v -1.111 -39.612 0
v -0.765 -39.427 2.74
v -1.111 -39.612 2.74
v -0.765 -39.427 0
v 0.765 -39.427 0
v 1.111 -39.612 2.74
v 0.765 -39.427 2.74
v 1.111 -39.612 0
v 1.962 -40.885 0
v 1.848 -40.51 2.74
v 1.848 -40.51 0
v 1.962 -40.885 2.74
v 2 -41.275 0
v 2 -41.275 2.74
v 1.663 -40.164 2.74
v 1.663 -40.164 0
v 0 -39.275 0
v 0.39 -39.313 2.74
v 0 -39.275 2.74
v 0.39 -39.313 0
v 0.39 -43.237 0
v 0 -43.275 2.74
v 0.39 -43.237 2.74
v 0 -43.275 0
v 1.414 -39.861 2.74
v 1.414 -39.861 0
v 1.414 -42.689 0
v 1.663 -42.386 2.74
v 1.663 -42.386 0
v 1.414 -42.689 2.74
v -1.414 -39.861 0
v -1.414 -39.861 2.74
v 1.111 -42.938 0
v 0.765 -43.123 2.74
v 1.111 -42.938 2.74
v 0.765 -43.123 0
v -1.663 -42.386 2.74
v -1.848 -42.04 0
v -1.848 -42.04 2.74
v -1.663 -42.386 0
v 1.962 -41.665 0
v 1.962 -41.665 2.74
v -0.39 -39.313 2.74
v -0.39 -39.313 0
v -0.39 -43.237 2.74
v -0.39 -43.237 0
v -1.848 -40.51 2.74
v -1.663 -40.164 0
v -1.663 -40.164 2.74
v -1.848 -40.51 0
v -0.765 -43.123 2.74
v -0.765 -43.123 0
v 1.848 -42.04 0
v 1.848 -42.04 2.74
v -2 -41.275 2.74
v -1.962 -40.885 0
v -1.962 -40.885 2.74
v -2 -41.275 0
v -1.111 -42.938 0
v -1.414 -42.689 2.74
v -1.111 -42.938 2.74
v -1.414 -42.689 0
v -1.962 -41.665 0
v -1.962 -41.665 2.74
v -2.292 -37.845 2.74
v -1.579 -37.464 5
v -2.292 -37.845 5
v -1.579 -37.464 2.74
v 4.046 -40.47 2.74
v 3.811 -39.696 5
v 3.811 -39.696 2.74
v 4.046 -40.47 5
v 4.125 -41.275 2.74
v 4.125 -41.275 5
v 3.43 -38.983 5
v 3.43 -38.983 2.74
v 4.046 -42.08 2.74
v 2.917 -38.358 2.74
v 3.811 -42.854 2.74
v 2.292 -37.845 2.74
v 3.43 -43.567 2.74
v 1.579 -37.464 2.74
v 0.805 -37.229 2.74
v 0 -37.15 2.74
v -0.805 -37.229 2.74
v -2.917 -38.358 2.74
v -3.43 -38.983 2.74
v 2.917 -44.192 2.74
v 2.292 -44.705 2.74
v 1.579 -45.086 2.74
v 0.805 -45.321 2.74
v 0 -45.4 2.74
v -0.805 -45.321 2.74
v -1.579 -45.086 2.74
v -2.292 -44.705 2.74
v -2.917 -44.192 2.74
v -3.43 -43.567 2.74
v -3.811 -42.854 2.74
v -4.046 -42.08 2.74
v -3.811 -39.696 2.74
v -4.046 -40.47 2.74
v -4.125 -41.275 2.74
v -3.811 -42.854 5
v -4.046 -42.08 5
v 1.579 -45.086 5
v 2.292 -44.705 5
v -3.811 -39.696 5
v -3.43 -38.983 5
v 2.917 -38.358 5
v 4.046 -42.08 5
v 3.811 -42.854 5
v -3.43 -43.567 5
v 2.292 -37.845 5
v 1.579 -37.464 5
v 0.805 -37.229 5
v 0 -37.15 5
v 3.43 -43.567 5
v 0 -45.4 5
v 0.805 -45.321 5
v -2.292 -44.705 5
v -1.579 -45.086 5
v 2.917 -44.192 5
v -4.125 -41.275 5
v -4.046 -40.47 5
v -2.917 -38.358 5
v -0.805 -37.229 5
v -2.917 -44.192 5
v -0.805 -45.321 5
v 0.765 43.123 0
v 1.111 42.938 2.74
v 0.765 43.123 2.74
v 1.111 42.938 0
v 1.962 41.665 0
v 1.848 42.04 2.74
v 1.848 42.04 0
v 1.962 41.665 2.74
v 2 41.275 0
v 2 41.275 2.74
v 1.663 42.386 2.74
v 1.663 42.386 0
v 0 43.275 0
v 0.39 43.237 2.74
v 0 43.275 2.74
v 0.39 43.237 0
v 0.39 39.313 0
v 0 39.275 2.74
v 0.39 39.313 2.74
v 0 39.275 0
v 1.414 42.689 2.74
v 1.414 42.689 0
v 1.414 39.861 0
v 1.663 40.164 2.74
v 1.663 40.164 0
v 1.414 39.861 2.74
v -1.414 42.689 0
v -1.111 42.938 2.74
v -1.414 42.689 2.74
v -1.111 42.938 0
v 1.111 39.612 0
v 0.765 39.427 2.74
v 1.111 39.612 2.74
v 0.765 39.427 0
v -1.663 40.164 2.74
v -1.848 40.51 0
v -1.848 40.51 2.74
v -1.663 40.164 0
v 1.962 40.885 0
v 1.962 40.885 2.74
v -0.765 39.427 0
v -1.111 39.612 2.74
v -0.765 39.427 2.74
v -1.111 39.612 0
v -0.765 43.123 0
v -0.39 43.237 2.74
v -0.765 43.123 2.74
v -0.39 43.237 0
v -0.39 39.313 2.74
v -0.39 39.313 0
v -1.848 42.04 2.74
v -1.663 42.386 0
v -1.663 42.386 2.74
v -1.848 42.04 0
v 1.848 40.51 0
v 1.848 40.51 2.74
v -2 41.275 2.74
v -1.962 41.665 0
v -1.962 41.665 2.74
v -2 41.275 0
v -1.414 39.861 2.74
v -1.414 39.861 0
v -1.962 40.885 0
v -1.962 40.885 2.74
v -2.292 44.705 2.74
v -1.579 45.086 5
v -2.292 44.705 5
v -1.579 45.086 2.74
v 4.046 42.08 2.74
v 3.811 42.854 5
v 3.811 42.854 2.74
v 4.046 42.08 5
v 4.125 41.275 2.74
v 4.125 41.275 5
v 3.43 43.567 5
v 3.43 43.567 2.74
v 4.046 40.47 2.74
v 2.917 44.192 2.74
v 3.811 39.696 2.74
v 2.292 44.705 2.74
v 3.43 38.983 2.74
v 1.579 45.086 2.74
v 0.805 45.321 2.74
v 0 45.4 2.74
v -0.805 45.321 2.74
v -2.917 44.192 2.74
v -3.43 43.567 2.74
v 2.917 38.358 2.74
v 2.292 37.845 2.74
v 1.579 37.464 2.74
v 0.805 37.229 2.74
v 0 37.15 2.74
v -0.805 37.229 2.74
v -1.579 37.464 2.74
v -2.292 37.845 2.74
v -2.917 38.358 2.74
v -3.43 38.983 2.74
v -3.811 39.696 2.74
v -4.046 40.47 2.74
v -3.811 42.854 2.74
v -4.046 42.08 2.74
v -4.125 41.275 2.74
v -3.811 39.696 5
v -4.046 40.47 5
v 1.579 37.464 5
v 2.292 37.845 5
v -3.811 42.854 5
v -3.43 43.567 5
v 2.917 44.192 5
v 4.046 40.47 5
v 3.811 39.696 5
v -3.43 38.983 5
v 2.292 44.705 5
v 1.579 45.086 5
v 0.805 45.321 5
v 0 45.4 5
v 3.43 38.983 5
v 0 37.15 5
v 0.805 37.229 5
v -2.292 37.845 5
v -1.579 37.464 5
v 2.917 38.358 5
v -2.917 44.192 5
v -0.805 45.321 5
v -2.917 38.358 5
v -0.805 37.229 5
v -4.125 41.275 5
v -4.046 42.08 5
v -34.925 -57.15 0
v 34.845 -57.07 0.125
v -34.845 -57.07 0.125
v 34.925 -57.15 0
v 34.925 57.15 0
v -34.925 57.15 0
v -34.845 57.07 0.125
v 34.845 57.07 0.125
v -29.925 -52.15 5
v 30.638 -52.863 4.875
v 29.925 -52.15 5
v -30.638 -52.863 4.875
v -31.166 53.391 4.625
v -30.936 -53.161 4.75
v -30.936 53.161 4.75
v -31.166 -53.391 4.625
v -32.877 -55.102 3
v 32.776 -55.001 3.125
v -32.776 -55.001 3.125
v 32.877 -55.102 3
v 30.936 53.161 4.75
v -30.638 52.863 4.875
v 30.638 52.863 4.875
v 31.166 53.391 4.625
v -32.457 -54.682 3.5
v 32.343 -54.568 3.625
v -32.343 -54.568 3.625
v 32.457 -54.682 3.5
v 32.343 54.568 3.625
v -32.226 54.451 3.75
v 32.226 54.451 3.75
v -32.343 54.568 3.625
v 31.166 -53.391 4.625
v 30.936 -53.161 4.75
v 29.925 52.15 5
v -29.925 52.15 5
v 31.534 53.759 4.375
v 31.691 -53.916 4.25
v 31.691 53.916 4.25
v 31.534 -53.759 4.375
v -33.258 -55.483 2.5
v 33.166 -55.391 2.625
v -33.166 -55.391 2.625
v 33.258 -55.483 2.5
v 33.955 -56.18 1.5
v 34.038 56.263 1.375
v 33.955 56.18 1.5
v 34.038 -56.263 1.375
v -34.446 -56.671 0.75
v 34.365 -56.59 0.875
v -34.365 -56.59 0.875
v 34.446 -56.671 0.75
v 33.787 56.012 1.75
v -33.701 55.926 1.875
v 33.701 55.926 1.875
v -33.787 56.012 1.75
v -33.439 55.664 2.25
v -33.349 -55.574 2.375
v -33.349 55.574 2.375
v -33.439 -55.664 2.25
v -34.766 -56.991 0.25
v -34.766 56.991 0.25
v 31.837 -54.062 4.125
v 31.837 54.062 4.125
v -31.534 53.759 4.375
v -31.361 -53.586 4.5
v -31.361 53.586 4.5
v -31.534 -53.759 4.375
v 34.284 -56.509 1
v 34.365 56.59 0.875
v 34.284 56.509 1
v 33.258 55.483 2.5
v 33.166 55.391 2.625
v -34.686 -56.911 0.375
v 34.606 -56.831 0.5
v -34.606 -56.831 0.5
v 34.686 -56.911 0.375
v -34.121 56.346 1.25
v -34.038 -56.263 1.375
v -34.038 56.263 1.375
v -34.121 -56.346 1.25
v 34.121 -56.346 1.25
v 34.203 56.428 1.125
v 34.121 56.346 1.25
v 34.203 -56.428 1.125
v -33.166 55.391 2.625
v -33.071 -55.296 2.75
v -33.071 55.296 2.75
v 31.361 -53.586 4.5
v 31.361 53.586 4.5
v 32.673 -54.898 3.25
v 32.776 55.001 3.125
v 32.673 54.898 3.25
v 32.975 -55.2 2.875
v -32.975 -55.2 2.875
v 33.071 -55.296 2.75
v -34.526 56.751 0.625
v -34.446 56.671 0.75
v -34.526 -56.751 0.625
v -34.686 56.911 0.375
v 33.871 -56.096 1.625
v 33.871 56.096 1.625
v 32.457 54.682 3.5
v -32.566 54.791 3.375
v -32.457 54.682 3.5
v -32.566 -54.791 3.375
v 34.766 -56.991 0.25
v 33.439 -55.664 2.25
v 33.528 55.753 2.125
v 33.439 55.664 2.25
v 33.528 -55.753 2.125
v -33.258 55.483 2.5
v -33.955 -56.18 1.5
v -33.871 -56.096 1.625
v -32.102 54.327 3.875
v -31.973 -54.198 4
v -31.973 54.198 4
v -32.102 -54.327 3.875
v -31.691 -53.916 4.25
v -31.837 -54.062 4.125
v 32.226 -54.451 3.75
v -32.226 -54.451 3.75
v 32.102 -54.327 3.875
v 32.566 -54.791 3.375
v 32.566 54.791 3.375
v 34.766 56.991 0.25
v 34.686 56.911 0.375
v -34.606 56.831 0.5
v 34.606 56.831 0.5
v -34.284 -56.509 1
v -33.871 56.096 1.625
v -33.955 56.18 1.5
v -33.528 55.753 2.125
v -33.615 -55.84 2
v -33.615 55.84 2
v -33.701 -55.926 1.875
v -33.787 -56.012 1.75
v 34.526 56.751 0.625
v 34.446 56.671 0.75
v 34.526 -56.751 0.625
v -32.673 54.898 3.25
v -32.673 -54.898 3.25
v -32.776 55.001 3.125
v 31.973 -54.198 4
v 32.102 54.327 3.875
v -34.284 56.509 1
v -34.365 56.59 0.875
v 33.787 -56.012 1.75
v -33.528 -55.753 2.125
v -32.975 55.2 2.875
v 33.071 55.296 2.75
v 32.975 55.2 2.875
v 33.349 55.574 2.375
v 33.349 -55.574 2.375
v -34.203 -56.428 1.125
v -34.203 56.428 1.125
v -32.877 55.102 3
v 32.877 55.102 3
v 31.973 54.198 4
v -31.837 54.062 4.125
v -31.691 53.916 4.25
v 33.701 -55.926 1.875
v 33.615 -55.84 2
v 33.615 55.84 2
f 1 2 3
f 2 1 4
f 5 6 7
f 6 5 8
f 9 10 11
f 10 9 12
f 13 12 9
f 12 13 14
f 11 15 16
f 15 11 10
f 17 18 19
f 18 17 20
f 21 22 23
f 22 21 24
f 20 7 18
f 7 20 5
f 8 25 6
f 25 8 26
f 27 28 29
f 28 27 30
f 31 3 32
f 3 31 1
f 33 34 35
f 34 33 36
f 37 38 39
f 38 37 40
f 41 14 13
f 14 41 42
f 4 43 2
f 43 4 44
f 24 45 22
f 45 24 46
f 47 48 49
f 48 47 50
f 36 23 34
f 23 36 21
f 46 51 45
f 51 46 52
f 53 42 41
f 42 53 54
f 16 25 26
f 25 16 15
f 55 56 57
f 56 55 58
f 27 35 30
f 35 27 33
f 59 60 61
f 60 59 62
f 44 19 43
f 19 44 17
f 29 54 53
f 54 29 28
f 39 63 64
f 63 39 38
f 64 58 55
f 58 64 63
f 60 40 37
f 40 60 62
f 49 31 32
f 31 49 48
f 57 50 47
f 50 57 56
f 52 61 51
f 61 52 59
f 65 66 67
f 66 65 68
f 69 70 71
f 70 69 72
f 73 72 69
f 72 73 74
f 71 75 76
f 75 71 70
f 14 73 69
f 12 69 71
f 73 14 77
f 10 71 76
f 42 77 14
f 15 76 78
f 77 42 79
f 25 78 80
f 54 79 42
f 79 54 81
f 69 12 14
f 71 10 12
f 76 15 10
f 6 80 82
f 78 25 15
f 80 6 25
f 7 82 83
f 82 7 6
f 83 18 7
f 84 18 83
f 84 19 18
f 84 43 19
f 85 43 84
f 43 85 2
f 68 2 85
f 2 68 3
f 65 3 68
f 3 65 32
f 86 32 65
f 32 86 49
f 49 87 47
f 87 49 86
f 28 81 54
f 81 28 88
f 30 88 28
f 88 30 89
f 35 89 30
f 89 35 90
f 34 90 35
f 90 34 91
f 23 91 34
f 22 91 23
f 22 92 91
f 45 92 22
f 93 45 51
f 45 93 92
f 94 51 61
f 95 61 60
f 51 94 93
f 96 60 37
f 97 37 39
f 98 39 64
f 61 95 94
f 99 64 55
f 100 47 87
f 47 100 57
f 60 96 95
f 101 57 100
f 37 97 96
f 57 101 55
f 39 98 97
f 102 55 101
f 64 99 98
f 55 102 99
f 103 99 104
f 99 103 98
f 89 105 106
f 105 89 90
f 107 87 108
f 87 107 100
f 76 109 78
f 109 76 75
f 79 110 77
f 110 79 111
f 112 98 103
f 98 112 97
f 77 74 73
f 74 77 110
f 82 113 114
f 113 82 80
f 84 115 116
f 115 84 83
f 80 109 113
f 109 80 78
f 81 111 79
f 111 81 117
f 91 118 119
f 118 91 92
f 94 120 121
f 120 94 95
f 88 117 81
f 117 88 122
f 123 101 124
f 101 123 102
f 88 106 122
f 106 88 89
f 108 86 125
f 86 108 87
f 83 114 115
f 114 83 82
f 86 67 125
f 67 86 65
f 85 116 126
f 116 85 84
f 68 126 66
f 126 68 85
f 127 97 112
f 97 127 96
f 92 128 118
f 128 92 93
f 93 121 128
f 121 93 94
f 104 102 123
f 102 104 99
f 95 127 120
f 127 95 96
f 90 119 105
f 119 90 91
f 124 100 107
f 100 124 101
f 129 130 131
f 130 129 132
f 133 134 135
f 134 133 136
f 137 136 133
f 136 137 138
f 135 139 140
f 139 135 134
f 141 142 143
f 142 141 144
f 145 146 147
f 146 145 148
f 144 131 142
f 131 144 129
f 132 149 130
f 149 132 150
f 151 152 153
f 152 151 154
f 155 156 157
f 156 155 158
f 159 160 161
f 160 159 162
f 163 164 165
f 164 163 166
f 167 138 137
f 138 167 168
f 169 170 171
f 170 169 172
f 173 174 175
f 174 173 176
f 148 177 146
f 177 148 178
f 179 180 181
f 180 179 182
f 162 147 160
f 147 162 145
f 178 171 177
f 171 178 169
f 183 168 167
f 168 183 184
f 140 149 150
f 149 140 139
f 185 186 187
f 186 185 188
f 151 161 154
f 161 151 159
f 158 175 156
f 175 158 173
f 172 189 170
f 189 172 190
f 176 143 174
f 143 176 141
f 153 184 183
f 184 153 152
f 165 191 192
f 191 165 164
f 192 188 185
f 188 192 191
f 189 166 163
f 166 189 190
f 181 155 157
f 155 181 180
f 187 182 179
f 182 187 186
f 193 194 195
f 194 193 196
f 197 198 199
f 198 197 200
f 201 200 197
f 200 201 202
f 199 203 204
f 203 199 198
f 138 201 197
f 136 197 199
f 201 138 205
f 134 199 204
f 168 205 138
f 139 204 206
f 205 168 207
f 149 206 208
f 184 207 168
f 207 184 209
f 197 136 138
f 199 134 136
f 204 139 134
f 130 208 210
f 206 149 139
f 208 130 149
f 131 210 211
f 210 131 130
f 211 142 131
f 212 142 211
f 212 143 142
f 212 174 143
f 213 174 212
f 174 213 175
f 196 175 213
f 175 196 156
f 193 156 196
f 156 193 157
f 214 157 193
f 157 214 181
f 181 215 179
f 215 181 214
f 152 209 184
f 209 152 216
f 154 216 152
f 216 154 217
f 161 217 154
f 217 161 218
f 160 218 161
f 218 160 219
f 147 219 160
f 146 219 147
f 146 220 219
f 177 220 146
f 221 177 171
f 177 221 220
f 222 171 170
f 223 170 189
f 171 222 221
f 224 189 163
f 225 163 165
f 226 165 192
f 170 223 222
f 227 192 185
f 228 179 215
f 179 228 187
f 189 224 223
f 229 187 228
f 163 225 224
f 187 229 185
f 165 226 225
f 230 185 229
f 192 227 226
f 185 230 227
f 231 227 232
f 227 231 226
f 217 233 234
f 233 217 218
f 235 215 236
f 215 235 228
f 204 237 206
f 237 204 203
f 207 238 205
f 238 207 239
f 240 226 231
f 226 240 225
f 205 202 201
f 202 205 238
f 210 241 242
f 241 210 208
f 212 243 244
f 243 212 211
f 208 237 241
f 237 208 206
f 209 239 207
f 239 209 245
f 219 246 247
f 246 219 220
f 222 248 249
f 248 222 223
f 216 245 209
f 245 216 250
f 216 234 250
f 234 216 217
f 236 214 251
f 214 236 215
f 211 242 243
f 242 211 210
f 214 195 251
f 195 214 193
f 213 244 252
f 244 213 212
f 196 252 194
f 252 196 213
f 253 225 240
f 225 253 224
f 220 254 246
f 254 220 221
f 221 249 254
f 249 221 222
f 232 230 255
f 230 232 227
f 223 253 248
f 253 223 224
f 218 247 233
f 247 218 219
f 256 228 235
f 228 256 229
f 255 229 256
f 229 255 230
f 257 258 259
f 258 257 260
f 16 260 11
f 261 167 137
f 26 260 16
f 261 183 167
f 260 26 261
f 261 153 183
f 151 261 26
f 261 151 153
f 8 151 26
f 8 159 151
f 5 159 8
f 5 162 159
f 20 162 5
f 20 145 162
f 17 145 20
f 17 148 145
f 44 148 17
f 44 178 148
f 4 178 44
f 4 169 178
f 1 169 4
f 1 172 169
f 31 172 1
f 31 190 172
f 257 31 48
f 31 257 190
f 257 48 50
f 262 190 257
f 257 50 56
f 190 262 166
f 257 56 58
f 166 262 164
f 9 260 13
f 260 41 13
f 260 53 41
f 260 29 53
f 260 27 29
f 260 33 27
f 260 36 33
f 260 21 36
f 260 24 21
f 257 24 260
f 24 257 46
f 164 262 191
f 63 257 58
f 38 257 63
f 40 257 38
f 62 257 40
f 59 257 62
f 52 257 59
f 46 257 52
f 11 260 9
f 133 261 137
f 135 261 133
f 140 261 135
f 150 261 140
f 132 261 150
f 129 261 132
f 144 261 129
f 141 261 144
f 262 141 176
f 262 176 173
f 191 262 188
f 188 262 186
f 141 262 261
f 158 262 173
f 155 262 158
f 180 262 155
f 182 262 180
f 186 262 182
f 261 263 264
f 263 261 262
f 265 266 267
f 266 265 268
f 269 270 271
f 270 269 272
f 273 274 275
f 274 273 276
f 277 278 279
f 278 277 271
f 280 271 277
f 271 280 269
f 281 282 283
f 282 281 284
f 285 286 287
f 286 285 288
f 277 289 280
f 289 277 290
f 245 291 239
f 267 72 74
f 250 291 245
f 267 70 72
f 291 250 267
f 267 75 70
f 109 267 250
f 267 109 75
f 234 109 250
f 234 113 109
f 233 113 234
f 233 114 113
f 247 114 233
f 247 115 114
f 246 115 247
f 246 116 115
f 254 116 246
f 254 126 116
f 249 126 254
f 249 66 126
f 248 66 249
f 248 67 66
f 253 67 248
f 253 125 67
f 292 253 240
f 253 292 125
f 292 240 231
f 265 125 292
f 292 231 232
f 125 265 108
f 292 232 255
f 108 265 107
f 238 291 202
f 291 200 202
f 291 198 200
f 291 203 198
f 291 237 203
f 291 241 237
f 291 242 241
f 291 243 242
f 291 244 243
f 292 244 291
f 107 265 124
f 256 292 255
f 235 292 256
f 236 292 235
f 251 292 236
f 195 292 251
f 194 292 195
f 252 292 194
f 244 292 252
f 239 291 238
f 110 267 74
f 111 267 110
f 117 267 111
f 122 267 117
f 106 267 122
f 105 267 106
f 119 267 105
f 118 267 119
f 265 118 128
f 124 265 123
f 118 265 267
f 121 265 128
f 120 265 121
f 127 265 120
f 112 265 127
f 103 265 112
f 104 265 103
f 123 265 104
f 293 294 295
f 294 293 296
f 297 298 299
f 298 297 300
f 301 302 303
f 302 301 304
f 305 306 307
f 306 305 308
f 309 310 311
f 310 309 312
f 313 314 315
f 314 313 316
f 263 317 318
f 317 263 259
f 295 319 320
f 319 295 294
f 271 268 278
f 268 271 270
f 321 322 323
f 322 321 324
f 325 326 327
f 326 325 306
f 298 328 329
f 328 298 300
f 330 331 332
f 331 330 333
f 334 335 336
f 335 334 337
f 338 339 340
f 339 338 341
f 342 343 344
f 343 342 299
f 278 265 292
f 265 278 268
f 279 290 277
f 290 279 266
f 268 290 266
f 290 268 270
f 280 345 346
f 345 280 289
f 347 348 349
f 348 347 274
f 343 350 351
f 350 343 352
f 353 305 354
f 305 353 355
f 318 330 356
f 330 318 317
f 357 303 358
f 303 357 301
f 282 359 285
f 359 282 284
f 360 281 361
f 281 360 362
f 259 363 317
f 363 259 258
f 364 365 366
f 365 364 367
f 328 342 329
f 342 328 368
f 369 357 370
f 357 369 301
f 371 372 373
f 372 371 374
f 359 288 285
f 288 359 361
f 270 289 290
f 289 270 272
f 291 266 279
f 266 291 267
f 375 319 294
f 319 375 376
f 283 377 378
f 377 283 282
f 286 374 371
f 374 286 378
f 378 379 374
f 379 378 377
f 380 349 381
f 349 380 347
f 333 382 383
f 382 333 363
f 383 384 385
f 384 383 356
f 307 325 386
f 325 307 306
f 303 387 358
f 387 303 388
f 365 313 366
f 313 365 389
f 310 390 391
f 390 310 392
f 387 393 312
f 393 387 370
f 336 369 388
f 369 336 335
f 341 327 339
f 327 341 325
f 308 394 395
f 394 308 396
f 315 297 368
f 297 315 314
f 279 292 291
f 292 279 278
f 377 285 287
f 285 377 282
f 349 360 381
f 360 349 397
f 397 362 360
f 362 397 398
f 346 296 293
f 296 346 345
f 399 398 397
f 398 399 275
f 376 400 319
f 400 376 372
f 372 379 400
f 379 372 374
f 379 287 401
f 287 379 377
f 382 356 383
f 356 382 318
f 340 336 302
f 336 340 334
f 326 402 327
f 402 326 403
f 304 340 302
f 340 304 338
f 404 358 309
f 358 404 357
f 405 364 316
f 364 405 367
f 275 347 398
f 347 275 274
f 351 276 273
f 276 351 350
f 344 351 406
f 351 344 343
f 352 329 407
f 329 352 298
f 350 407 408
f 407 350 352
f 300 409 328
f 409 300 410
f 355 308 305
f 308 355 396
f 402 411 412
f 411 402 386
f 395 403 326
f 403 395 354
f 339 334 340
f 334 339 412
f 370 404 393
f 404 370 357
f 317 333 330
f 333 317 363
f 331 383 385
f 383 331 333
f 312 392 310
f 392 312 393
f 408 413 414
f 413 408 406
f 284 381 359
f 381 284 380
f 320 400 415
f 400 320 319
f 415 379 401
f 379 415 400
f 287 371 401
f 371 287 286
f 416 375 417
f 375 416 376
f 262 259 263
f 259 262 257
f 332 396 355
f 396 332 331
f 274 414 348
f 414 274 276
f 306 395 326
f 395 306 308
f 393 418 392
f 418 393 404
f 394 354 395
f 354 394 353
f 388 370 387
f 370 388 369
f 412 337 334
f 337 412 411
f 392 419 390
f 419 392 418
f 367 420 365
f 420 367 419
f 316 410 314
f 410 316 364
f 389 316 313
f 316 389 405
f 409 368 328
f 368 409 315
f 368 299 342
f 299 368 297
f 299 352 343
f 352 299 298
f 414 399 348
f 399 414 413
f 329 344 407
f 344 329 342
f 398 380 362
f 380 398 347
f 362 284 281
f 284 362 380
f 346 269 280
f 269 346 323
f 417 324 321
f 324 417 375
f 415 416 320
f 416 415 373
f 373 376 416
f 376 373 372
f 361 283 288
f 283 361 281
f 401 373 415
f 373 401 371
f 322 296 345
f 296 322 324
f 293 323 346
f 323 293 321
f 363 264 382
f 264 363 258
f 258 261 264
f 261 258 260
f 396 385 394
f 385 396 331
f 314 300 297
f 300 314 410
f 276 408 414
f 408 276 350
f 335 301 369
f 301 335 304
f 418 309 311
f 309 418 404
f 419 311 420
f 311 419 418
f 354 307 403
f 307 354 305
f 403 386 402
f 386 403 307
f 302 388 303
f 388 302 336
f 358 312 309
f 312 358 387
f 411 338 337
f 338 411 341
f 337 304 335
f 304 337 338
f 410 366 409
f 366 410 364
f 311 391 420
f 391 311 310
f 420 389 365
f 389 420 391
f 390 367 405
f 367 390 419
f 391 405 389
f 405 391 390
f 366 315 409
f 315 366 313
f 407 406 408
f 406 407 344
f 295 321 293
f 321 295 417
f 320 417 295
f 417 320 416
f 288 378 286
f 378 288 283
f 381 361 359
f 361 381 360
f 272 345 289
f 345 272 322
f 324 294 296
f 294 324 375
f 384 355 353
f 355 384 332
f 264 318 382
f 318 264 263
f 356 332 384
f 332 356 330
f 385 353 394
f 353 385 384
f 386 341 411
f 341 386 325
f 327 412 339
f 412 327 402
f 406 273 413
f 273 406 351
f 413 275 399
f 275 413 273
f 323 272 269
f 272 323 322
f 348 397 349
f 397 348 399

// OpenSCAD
h = 114.3;
w = 69.85;
screwSpacing = 82.55;
thickness = 5;
taper = 5;
screwDiameter = 4;
screwHeadDiameter = 8.25;
screwHeadDepth = 2.25;
taperFormula = "asin(t)/90";

module end_of_parameters_dummy() {}


//BEGIN: use <tubemesh.scad>;

//BEGIN: use <eval.scad>;
function _isString(v) = v >= "";
function _isVector(v) = !(v>="") && len(v) != undef;
function _isFloat(v) = v+0 != undef;

function _substr(s, start=0, stop=undef, soFar = "") =
    start >= (stop==undef ? len(s) : stop) ? soFar :
        _substr(s, start=start+1, stop=stop, soFar=str(soFar, s[start]));

function _parseInt(s, start=0, stop=undef, accumulated=0) =
    let( stop = stop==undef ? len(s) : stop )
        start >= stop ? accumulated :
        s[start] == "+" ? _parseInt(s, start=start+1, stop=stop) :
        s[start] == "-" ? -_parseInt(s, start=start+1, stop=stop) :
        let (digit = search(s[start], "0123456789"))
            digit == [] ? 0 : _parseInt(s, start=start+1, stop=stop, accumulated=accumulated*10+digit[0]);

function _findNonDigit(s, start=0) =
    start >= len(s) || s[start]<"0" || s[start]>"9" ? start :
    _findNonDigit(s, start=start+1);

function _replaceChar(s,c1,c2,pos=0,soFar="") =
    pos >= len(s) ? soFar :
    _replaceChar(s,c1,c2,pos=pos+1,soFar=str(soFar, s[pos]==c1 ? c2 : s[pos]));

function _parseUnsignedFloat(s) =
    len(s) == 0 ? 0 :
        let(
            firstNonDigit = _findNonDigit(s),
            decimalPart = s[firstNonDigit]!="." ?
                [firstNonDigit,firstNonDigit] : [firstNonDigit+1, _findNonDigit(s, start=firstNonDigit+1)],
            intPart = _parseInt(s,start=0,stop=firstNonDigit),
            fractionPart = _parseInt(s,start=decimalPart[0],stop=decimalPart[1]),
            baseExp = s[decimalPart[1]]=="e" || s[decimalPart[1]]=="E" ? pow(10,_parseInt(s, start=decimalPart[1]+1)) : 1)
            (intPart+fractionPart*pow(10,-(decimalPart[1]-decimalPart[0])))*baseExp;

function _tail(v) = len(v)>=2 ? [for(i=[1:len(v)-1]) v[i]] : [];
function _isspace(c) = (" " == c || "\t" == c || "\r" == c || "\n" == c );
function _isdigit(c) = ("0" <= c && c <= "9" );
function _isalpha(c) = ("a" <= c && c <= "z") || ("A" <= c && c <= "Z");
function _isalpha_(c) = _isalpha(c)  || c=="_";
function _isalnum_(c) = _isalpha(c) || _isdigit(c) || c=="_";
function _flattenLists(ll) = [for(a=ll) for(b=a) b];

function _spaceSequence(s, start=0, count=0) =
    len(s)>start && _isspace(s[start]) ? _spaceSequence(s, start=start+1, count=count+1) : count;
function _digitSequence(s, start=0, count=0) =
    len(s)>start && _isdigit(s[start]) ? _digitSequence(s, start=start+1,count=count+1) : count;
function _alnum_Sequence(s, start=0, count=0) =
    len(s)>start && _isalnum_(s[start]) ? _alnum_Sequence(s, start=start+1,count=count+1) : count;
function _identifierSequence(s, start=0, count=0) =
    len(s)>start && _isalpha_(s[start]) ? _alnum_Sequence(s, start=start+1, count=count+1) : count;
function _signedDigitSequence(s, start=0) =
    len(s) <= start ? 0 :
        (s[start] == "+" || s[start] == "-" ) ? 1+_digitSequence(s,start=start+1) : _digitSequence(s,start=start);
function _realStartingWithDecimal(s, start=0) =
    len(s)>start && s[start] == "." ?
        let(next = start+1+_digitSequence(s, start=start+1))
        (s[next] == "e" || s[next] == "E" ?
            next-start+1+_signedDigitSequence(s, start=next+1) : next-start)
        : 0;
function _realContinuation(s, start=0) =
    len(s) <= start ? 0 :
        let(c1=_realStartingWithDecimal(s, start=start))
        c1 > 0 ? c1 :
        s[start] == "e" || s[start] == "E" ?
            1+_signedDigitSequence(s, start=start+1) : 0;
function _positiveRealSequence(s, start=0) =
    len(s) <= start ? 0 :
        let(c1 = _realStartingWithDecimal(s, start=start))
            c1 > 0 ? c1 :
        let(c2 = _digitSequence(s, start=start))
            c2 > 0 ? c2 + _realContinuation(s, start=start+c2) : 0;

_multiSymbolOperators = [ "<=", ">=", "==", "&&", "||" ]; // must be in order of decreasing length

function _multiSymbolOperatorSequence(s, start=0) =
    (s[start]=="<" && s[start+1]=="=") ||
    (s[start]==">" && s[start+1]=="=") ||
    (s[start]=="=" && s[start+1]=="=") ||
    (s[start]=="!" && s[start+1]=="=") ||
    (s[start]=="&" && s[start+1]=="&") ||
    (s[start]=="|" && s[start+1]=="|") ? 2 : 0;

function _tokenize(s, start=0) =
    start >= len(s) ? [] :
    let(c1=_spaceSequence(s, start=start)) c1>0 ?
        concat([" "], _tokenize(s, start=start+c1)) :
    let(c2=_identifierSequence(s, start=start)) c2>0 ?
        concat([_substr(s, start=start, stop=start+c2)], _tokenize(s, start=start+c2)) :
    let(c3=_positiveRealSequence(s, start=start)) c3>0 ?
        concat([_substr(s, start=start, stop=start+c3)], _tokenize(s, start=start+c3)) :
    let(c4=_multiSymbolOperatorSequence(s, start=start)) c4>0 ?
        concat([_substr(s, start=start, stop=start+c4)], _tokenize(s, start=start+c4)) :
        concat([s[start]], _tokenize(s, start=start+1));


function _endParens(list,start=0,openCount=0,stop=undef) =
    let(stop = stop==undef ? len(list) : stop)
    start >= stop ? (openCount?undef:stop) :
    list[start][0] == ")" ?
            (openCount==1 ? start+1 : _endParens(list,start+1,stop=stop, openCount=openCount-1)) :
    _endParens(list,start+1,stop=stop, openCount=
        list[start][0] == "(" ?
            openCount+1 : openCount);

function _indexInTable(string, table, column=0) =
    let (s=search([string], table, index_col_num=column))
        s[0] == [] ? -1 : s[0][0];

_NAME = 0;
_ARITY = 1;
_PREC = 2;
_ASSOC_DIR = 3;
_ARGUMENTS_FROM_VECTOR = 4;
_OPERATOR = 5;
_EXTRA_DATA = 6;

function _func(op) = [ op, 1, -1, 1, true, op ];

_operators = [
    [ "[", 1, -1, 1, true, "[" ],
    [ "pow", 1, -1, 1, true, "^" ],
    [ "cross", 1, -1, 1, true, "cross" ],
    _func("sqrt"),
    _func("cos"),
    _func("sin"),
    _func("tan"),
    _func("acos"),
    _func("asin"),
    _func("atan"),
    _func("COS"),
    _func("SIN"),
    _func("TAN"),
    _func("ACOS"),
    _func("ASIN"),
    _func("ATAN"),
    _func("abs"),
    _func("ceil"),
    _func("exp"),
    _func("floor"),
    _func("ln"),
    _func("log"),
    _func("round"),
    _func("sign"),
    _func("norm"),
    [ "atan2", 1, -1, 1, true, "atan2" ],
    [ "ATAN2", 1, -1, 1, true, "ATAN2" ],
    [ "max", 1, -1, 1, true, "max" ],
    [ "min", 1, -1, 1, true, "min" ],
    [ "concat", 1, -1, 1, true, "concat" ],
    [ "#", 2, 0, -1, false, "#" ],
    [ "^", 2, 0, -1, false, "^" ],
    [ "#-",1, 0.5, 0, true, "-" ],
    [ "#+",1, 0.5, 0, true, "+" ],
    [ "*", 2, 1, 1, false, "*" ],
    [ "/", 2, 1, 1, false, "/" ],
    [ "%", 2, 1, 1, false, "%" ],
    [ "+", 2, 2, 1, true, "+" ],
    [ "-", 2, 2, 1, true, "-" ],
    [ "!=", 2, 3, 1, true, "!=" ],
    [ "==", 2, 3, 1, true, "==" ],
    [ "<=", 2, 3, 1, true, "<=" ],
    [ ">=", 2, 3, 1, true, ">=" ],
    [ "<", 2, 3, 1, true, "<" ],
    [ ">", 2, 3, 1, true, ">" ],
    [ "!", 1, 4, 1, true, "!" ],
    [ "&&", 2, 5, 1, true, "&&" ],
    [ "||", 2, 5, 1, true, "||" ],
    [ "?", 2, 10, -1, true, "?" ],
    [ ":", 2, 10, -1, true, ":" ],
    [ "=", 2, 30, 1, true, "=" ], // for let()
    [ "let", 1, 25, 1, true, "let" ],
    [ ",", 2, 100, 1, true, "," ]
   ];

_binary_or_unary = [ ["-", "#-"], ["+", "#+"], ["#", "["] ];

// insert parentheses in some places to tweak the order of
// operations in those contexts
function _fixBrackets(pretok,start=0) =
    start >= len(pretok) ? [] :
    pretok[start] == "[" ?
        concat(["#", "("], _fixBrackets(pretok,start=start+1)) :
    pretok[start] == "]" ?
        concat([")"], _fixBrackets(pretok,start=start+1)) :
    pretok[start] == "?" ?
        concat([pretok[start],"("], _fixBrackets(pretok,start=start+1)) :
    pretok[start] == ":" ?
        concat([")",pretok[start]], _fixBrackets(pretok,start=start+1)) :
        concat(pretok[start], _fixBrackets(pretok,start=start+1));

// disambiguate operators that can be unary or binary
function _fixUnaries(pretok) =
    [ for (i=[0:len(pretok)-1])
         let (
            a = pretok[i],
            j=_indexInTable(a, _binary_or_unary))
            (0 <= j && (i == 0 || pretok[i-1] == "(" ||
                0 <= _indexInTable(pretok[i-1], _operators)))? _binary_or_unary[j][1] : a ];

function _fixLet1(tok, start=0, stop=undef) =
    let (stop = stop==undef ? len(tok) : stop)
        start >= stop ? [] :
        tok[start][0] == "let"?
           let(endP=_endParens(tok,start=start+1,stop=stop,openCount=0)) concat([concat(tok[start], [_fixLet1(tok,start=start+2,stop=endP-1)])], _fixLet1(tok,start=endP,stop=stop)) :
        concat([tok[start]], _fixLet1(tok,start=start+1,stop=stop));

function _parsePass1(s) =
    let (pretok=_fixUnaries(_fixBrackets(_tokenize(s))))
    _fixLet1(
    [ for (i=[0:len(pretok)-1])
        let (a=pretok[i])
        if (a[0] != " ")
            let (j=_indexInTable(a, _operators))
                j >= 0 ? _operators[j] : [a] ] );

function _prec(op1, pos1, op2, pos2) =
    op1 != undef && op2 == undef ? false :
    op1 == undef && op2 != undef ? true :
    op1 == undef && op2 == undef ? true :
    op1[_ARITY] == 1 && pos1 > pos2 ? true :
    op2[_ARITY] == 1 && pos2 > pos1 ? false :
    op1[_PREC] < op2[_PREC] ? true :
        op2[_PREC] < op1[_PREC] ? false :
            op1[_ASSOC_DIR] * pos1 < op2[_ASSOC_DIR] * pos2;

function _parseLiteralOrVariable(s) =
        s == "PI" ? PI :
        s == "true" ? true :
        s == "false" ? false :
        s == "undef" ? undef :
        _isalpha_(s[0]) ? s :
        _parseUnsignedFloat(s);

function _isoperator(token) = _PREC<len(token);

function _getCandidatesForMainOperator(tok,start,stop) =
   start >= stop ? [] :
   tok[start][0] == "(" ?
        _getCandidatesForMainOperator(tok,_endParens(tok,start=start+1,stop=stop,openCount=1),stop)
        :
        _isoperator(tok[start]) ? concat([[tok[start],start]],_getCandidatesForMainOperator(tok,start+1,stop)) :
        _getCandidatesForMainOperator(tok,start+1,stop);

// Find the operator with least precedence
function _findMainOperatorPos(candidates,start=0) =
    len(candidates) <= start ? undef :
    let(rest=_findMainOperatorPos(candidates,start+1))
    _prec(candidates[rest][0], rest, candidates[start][0], start) ? start : rest;

function _firstOccurrence(c,opName,start=0) =
    start >= len(c) ? undef :
    c[start][0][0] == opName ? c[start] :
        _firstOccurrence(c,opName,start=start+1);

// We know the main operator is a ? or a :. We now need to find out which.
function _mainQuestionOperator(c) =
    let(fq = _firstOccurrence(c,"?"),
        fc = _firstOccurrence(c,":"))
        fq[1] != undef && (fc[1] == undef || fq[1] < fc[1]) ? fq : fc;

function _mainOperator(tok,start,stop) =
    let(c=_getCandidatesForMainOperator(tok,start,stop),
        pos=_findMainOperatorPos(c),
        m=c[pos])
        m[0][0] == "?" ?
            concat(m, [_firstOccurrence(c,":",start=pos+1)[1]])
            : m;

function _doLets(assignments, final, start=0) =
    start >= len(assignments) ? final :
    assignments[start][0] == "=" ? ["let", ["'", assignments[start][1]], assignments[start][2], _doLets(assignments, final, start=start+1)] : _doLets(assignments, final, start=start+1);

function _letOperator(a,b) =
    let(rawAssignments=_fixCommas(a),
        assignments=rawAssignments[0] == "[[" ?
            _tail(rawAssignments) : [a])
    _doLets(assignments, b);

/* This takes a fully tokenized vector, each element of which is either a line from the _operators table or a vector containing a single non-operator string, and parses it using general parenthesis and operator parsing. Comma expressions for building vectors will be parsed in the next pass. */
function _parseMain(tok,start=0,stop=undef) =
    let( stop= stop==undef ? len(tok) : stop )
        stop <= start ? undef :
        tok[start][0] == "(" && _endParens(tok,start=start+1,stop=stop,openCount=1)==stop ?
            _parseMain(tok,start=start+1,stop=stop-1) :
        let( lp = _mainOperator(tok,start,stop) )
            lp[0] == undef ? ( stop-start>1 ? undef : _parseLiteralOrVariable(tok[start][0]) ) :
            let( op = lp[0], pos = lp[1] )
                op[_NAME] == "?" ?
                    [ op[_OPERATOR], _parseMain(tok,start=start,stop=pos), _parseMain(tok,start=pos+1,stop=lp[2]), _parseMain(tok,start=lp[2]+1,stop=stop) ] :
                op[_NAME] == "let" ?
                    _letOperator( _parseMain(op[_EXTRA_DATA]), _parseMain(tok,start=pos+1,stop=stop)) :
                op[_ARITY] == 2 ?
                    (start==pos ?
                    /* unary */

                    let(j=_indexInTable(op[_OPERATOR], _binary_or_unary)) [ _binary_or_unary[j][1],_parseMain(tok,start=pos+1,stop=stop)] : [ op[_OPERATOR], _parseMain(tok,start=start,stop=pos), _parseMain(tok,start=pos+1,stop=stop)])
                    : [ op[_OPERATOR], _parseMain(tok,start=pos+1,stop=stop) ];


// this upgrades sequences of binary commas to vectors
function _fixCommas(expression) =
    expression[0] == "," ?
        let(a=_fixCommas(expression[1]),
            b=_fixCommas(expression[2]))
            a[0] == "[[" ?
                concat(["[["],concat(_tail(a), [b])) :
                ["[[",a,b]
        :
    _isVector(expression) ?
            concat([expression[0]], [for (i=[1:len(expression)-1]) _fixCommas(expression[i])]) :
            expression;

// fix arguments from vectors
function _fixArguments(expression) =
    let(i=_indexInTable(expression[0], _operators, _OPERATOR))
            i >=0 && _operators[i][_ARGUMENTS_FROM_VECTOR] && expression[1][0] == "[[" ? concat([expression[0]], [for (i=[1:len(expression[1])-1]) _fixArguments(expression[1][i])]) :
/*            expression[0] == "?" ?
                concat([expression[0],expression[1]],[for (i=[1:len(expression[2])-1]) _fixArguments(expression[2][i])]) : */
            len(expression)>1 && !_isString(expression) ?
                concat([expression[0]], [for (i=[1:len(expression)-1]) _fixArguments(expression[i])])
                    : expression;

function _optimizedLiteral(x) =
    len(x)==undef ? x : ["'", x];

function _wellDefined(x) =
    x==undef ? false :
    len(x)==undef ? true :
    x[0] == "'" ? true :
    len(x)==1 ? x[0]!=undef :
    len([for (a=x) if(!_wellDefined(a)) true])==0;

function _optimize(expression) =
    let(x=eval(expression,$careful=true))
        _wellDefined(x) ? _optimizedLiteral(x) :
        expression[0] == "'" ? _optimizedLiteral(x) :
        ! _isString(expression) ?
            concat([expression[0]], [for(i=[1:len(expression)-1]) (i>1 || expression[0] != "let") ?  _optimize(expression[i]) : expression[i]]) :
        expression;

function compileFunction(expression,optimize=true) =
            _isVector(expression) ? expression :
            _isFloat(expression) ? expression :
            let(unoptimized = _fixArguments(_fixCommas(_parseMain(_parsePass1(expression)))))
        optimize ? _optimize(unoptimized) : unoptimized;

function evaluateFunction(expression,variables) = eval(compileFunction(expression,optimize=false),variables);

function _let(v, var, value) = concat([var, value], v);

function _lookupVariable(var, table) =
    let (s=search([var], table, index_col_num=0))
        s[0] == [] ? undef : table[s[0][0]][1];

function _generate(var, range, expr, v) =
    [ for(i=range) eval(expr, _let(v, var, i)) ];

function _safeNorm(v) =
    ! _isVector(v) || len([for (x=v) x+0==undef]) ? undef : norm(v);

function eval(c,v=[]) =
    ""<=c ? _lookupVariable(c,v) :
    let(op=c[0]) (
    op == undef ? c :
    op == "'" ? c[1] :
    op == "+" ? (len(c)==2 ? eval(c[1],v) : eval(c[1],v)+eval(c[2],v)) :
    op == "-" ? (len(c)==2 ? -eval(c[1],v) : eval(c[1],v)-eval(c[2],v)) :
    op == "*" ? eval(c[1],v)*eval(c[2],v) :
    op == "/" ? eval(c[1],v)/eval(c[2],v) :
    op == "%" ? eval(c[1],v)%eval(c[2],v) :
    op == "sqrt" ? sqrt(eval(c[1],v)) :
    op == "^" || op == "pow" ? pow(eval(c[1],v),eval(c[2],v)) :
    op == "cos" ? cos(eval(c[1],v)) :
    op == "sin" ? sin(eval(c[1],v)) :
    op == "tan" ? tan(eval(c[1],v)) :
    op == "acos" ? acos(eval(c[1],v)) :
    op == "asin" ? asin(eval(c[1],v)) :
    op == "atan" ? atan(eval(c[1],v)) :
    op == "atan2" ? atan2(eval(c[1],v),eval(c[2],v)) :
    op == "COS" ? cos(eval(c[1],v)*180/PI) :
    op == "SIN" ? sin(eval(c[1],v)*180/PI) :
    op == "TAN" ? tan(eval(c[1],v)*180/PI) :
    op == "ACOS" ? acos(eval(c[1],v))*PI/180 :
    op == "ASIN" ? asin(eval(c[1],v))*PI/180 :
    op == "ATAN" ? atan(eval(c[1],v))*PI/180 :
    op == "ATAN2" ? atan2(eval(c[1],v),eval(c[2],v))*PI/180 :
    op == "abs" ? abs(eval(c[1],v)) :
    op == "ceil" ? ceil(eval(c[1],v)) :
    op == "cross" ? cross(eval(c[1],v),eval(c[2],v)) :
    op == "exp" ? exp(eval(c[1],v)) :
    op == "floor" ? floor(eval(c[1],v)) :
    op == "ln" ? ln(eval(c[1],v)) :
    op == "len" ? len(eval(c[1],v)) :
    op == "log" ? log(eval(c[1],v)) :
    op == "max" ? (len(c) == 2 ? max(eval(c[1],v)) : max([for(i=[1:len(c)-1]) eval(c[i],v)])) :
    op == "min" ? (len(c) == 2 ? min(eval(c[1],v)) : min([for(i=[1:len(c)-1]) eval(c[i],v)])) :
    op == "norm" ?
        (!$careful ? norm(eval(c[1],v)) : _safeNorm(eval(c[1],v))) :
    op == "rands" ? rands(eval(c[1],v),eval(c[2],v),eval(c[3],v),eval(c[4],v)) :
    op == "round" ? round(eval(c[1],v)) :
    op == "sign" ? sign(eval(c[1],v)) :
    op == "[" ? [for (i=[1:len(c)-1]) eval(c[i],v)] :
    op == "#" ? eval(c[1],v)[eval(c[2],v)] :
    op == "<" ? eval(c[1],v)<eval(c[2],v) :
    op == "<=" ? eval(c[1],v)<=eval(c[2],v) :
    op == ">=" ? eval(c[1],v)>=eval(c[2],v) :
    op == ">" ? eval(c[1],v)>=eval(c[2],v) :
    op == "==" ? (!$careful ? eval(c[1],v)==eval(c[2],v) :
        (let(c1=eval(c[1],v))
        c1==undef ? undef :
        let(c2=eval(c[2],v))
        c2==undef ? undef :
        c1 == c2) ) :
    op == "!=" ? (!$careful ? eval(c[1],v)!=eval(c[2],v) :
        (let(c1=eval(c[1],v))
        c1==undef ? undef :
        let(c2=eval(c[2],v))
        c2==undef ? undef :
        c1 != c2) ) :
    op == "&&" ? (!$careful ? eval(c[1],v)&&eval(c[2],v) :
        (let(c1=eval(c[1],v))
        c1==undef ? undef :
        !c1 ? false :
        let(c2=eval(c[2],v))
        c2==undef ? undef :
        c1 && c2) ) :
    op == "||" ? (!$careful ? eval(c[1],v)||eval(c[2],v) :
        (let(c1=eval(c[1],v))
        c1==undef ? undef :
        c1 ? true :
        let(c2=eval(c[2],v))
        c2==undef ? undef :
        c1 || c2) ) :
    op == "!" ? (!$careful ? !eval(c[1],v) :
        (let(c1=eval(c[1],v))
        c1==undef ? undef :
        !c1) ) :
    op == "?" ? (!$careful ? (eval(c[1],v)?eval(c[2],v):eval(c[3],v)) :
        (let(c1=eval(c[1],v))
        c1==undef ? undef :
        c1 ? eval(c[2],v):eval(c[3],v)) ):

    op == "concat" ? [for (i=[1:len(c)-1]) let(vect=eval(c[i],v)) for(j=[0:len(vect)-1]) vect[j]] :
    op == "range" ? (len(c)==3 ? [eval(c[1],v):eval(c[2],v)] : [eval(c[1],v):eval(c[2],v):eval(c[3],v)]) :
    op == "let" ? (!$careful ? eval(c[3],concat([[eval(c[1],v),eval(c[2],v)]], v)) :
            let(c1=eval(c[1],v),c2=eval(c[2],v))
                c1==undef || c2==undef ? undef :
                    eval(c[3],concat([[c1,c2]], v)) ) :
    op == "gen" ? _generate(eval(c[1],v),eval(c[2],v),c[3],v) :
    undef
    );

// per 10,000 operations with "x^3*y-x*y^3"
// 24 sec compile
// 21 sec unoptimized compile
// 22 sec evaluateFunction()
// 0.7 sec eval

// pass1 10 seconds [tokenize: 4 seconds]
// parseMain 6
// fixCommas 0
// fixArguments 3
// optimize 3
/*
echo(compileFunction("x^(2*3)"));
fc = compileFunction("x^3*y-x*y^3",optimize=true);
echo(fc);
echo(eval(fc,[["x",1],["y",1]]));
z=[for(i=[0:9999]) compileFunction("x^3*y-x*y^3",optimize=false)];//fc,[ ["x",1],["y",2] ])];
*/

//z = [for(i=[1:10000]) compileFunction("x^3*y-x*y^3")];
// normal: 23

//function repeat(s, copies, soFar="") = copies <= 0 ? soFar : repeat(s, copies-1, soFar=str(soFar,s));

//END: use <eval.scad>;


// params = [sections,sectionCounts]

// written for tail-recursion
// _subtotals[i] = list[0] + ... + list[i-1]
function _subtotals(list,soFar=[]) =
        len(soFar) >= 1+len(list) ? soFar :
        _subtotals(list,
            let(n1=len(soFar))
            concat(soFar, n1>0 ? soFar[n1-1]+list[n1-1] : 0));

function _flatten(list) = [for (a=list) for(b=a) b];

function _reverseTriangle(t) = [t[2], t[1], t[0]];

// smallest angle in triangle
function _minAngle(p1,p2,p3) =
    let(a = p2-p1,
        b = p3-p1,
        c = p3-p2,
        v1 = a*b,
        v2 = -(c*a))
        v1 == 0 || v2 == 0 ? 0 :
        let( na = norm(a),
             a1 = acos(v1 / (na*norm(b))),
             a2 = acos(v2 / (na*norm(c))) )
        min(a1,a2,180-(a1+a2));

// triangulate square to maximize smallest angle
function _doSquare(points,i11,i21,i22,i12,optimize=true) =
    points[i11]==points[i12] ? [[i11,i21,i22]] :
    points[i21]==points[i22] ? [[i22,i12,i11]] :
    !optimize ? [[i11,i21,i22], [i22,i12,i11]] :
    let (m1 = min(_minAngle(points[i11],points[i21],points[i22]), _minAngle(points[i22],points[i12],points[i11])),
        m2 = min(_minAngle(points[i11],points[i21],points[i12]),
                _minAngle(points[i21],points[i22],points[i12])) )
        m2 <= m1 ? [[i11,i21,i22], [i22,i12,i11]] :
                  [[i11,i21,i12], [i21,i22,i12]];

/*
function _inTriangle(v1,t) = (v1==t[0] || v1==t[1] || v1==t[2]);

function _findTheDistinctVertex(t1,t2) =
    let(in = [for(i=[0:2]) _inTriangle(t1[i],t2)])
    ! in[0] && in[1] && in[2] ? 0 :
    ! in[1] && in[0] && in[2] ? 1 :
    ! in[2] && in[0] && in[1] ? 2 :
    undef;

// make vertex i come first
function _rotateTriangle(t,i) =
    [for (j=[0:2]) t[(j+i)%3]];

function _optimize2Triangles(points,t1,t2) =
    let(i1 = _findTheDistinctVertex(t1,t2))
    i1 == undef ? [t1,t2] :
    let(i2 = _findTheDistinctVertex(t2,t1))
    i2 == undef ? [t1,t2] :
    let(t1 = _rotateTriangle(t1,i1),
        t2 = _rotateTriangle(t2,i2))
    _doSquare(points,t1[1],t2[0],t2[1],t1[0],optimize=true);

// a greedy optimization for a strip of triangles most of which adjoin one another; written for tail-recursion
function _optimizeTriangles(points,triangles,position=0,optimize=true,iterations=4) =
        !optimize || position >= iterations*len(triangles) ? triangles :
            _optimizeTriangles(points,
                let(
                    n = len(triangles),
                    position1=position%n,
                    position2=(position+1)%n,
                    opt=_optimize2Triangles(points,triangles[position1],triangles[position2]))
                    [for (i=[0:len(triangles)-1])
                        i == position1 ? opt[0] :
                        i == position2 ? opt[1] :
                            triangles[i]],
                position=position+1);
*/

function _removeEmptyTriangles(points,triangles) =
    [for(t=triangles)
        if(true || points[t[0]] != points[t[1]] && points[t[1]] != points[t[2]] && points[t[2]] != points[t[0]]) t];

// n1 and n2 should be fairly small, so this doesn't need
// tail-recursion
// this assumes n1<=n2
function _tubeSegmentTriangles(points,index1,n1,index2,n2,i=0,soFar=[],optimize=true)
    = i>=n2 ? _removeEmptyTriangles(points,soFar) :
            let(i21=i,
                i22=(i+1)%n2,
                i11=floor((i21)*n1/n2+0.5)%n1,
                i12=floor((i22)*n1/n2+0.5)%n1,
                add = i11==i12 ? [[index1+i11,index2+i21,index2+i22]] :
                    _doSquare(points,index1+i11,index2+i21,index2+i22,index1+i12,optimize=optimize))
                _tubeSegmentTriangles(points,index1,n1,index2,n2,i=i+1,soFar=concat(soFar,add),optimize=optimize);

function _tubeSegmentFaces(points,index,n1,n2,optimize=true)
    = n1<n2 ? _tubeSegmentTriangles(points,index,n1,index+n1,n2,optimize=optimize) :
        [for (f=_tubeSegmentTriangles(points,index+n1,n2,index,n1,optimize=optimize)) _reverseTriangle(f)];

function _tubeMiddleFaces(points,counts,subtotals,optimize=true) = [ for (i=[1:len(counts)-1])
           for (face=_tubeSegmentFaces(points,subtotals[i-1],counts[i-1],counts[i],optimize=optimize)) face ];

function _endCaps(counts,subtotals,startCap=true,endCap=true) =
    let( n = len(counts),
         cap1 = counts[0]<=2 || !startCap ? undef : [for(i=[0:counts[0]-1]) i],
         cap2 = counts[n-1]<=2 || !endCap ? undef : [for(i=[counts[n-1]-1:-1:0]) subtotals[n-1]+i] )
       [for (c=[cap1,cap2]) if (c!=undef) c];

function _tubeFaces(sections,startCap=true,endCap=true,optimize=true) =
                let(
        counts = [for (s=sections) len(s)],
        points = _flatten(sections),
        subtotals = _subtotals(counts))
            concat(_tubeMiddleFaces(points,counts,subtotals,optimize=optimize),_endCaps(counts,subtotals,startCap=true,endCap=true));

function _removeDuplicates1(points,soFar=[[],[]]) =
        len(soFar[0]) >= len(points) ? soFar :
            _removeDuplicates1(points,
               let(
                mapSoFar=soFar[0],
                pointsSoFar=soFar[1],
                j=len(mapSoFar),
                k=search([points[j]], pointsSoFar)[0])
                k == []? [concat(mapSoFar,[len(pointsSoFar)]),
                            concat(pointsSoFar,[points[j]])] :
                           [concat(mapSoFar,[k]),pointsSoFar]);

function _removeDuplicates(points, faces) =
    let(fix=_removeDuplicates1(points),
        map=fix[0],
        newPoints=fix[1],
        newFaces=[for(f=faces) [for(v=f) map[v]]])
            [newPoints, newFaces];

function pointsAndFaces(sections,startCap=true,endCap=true,optimize=true) =
        let(
            points0=_flatten(sections),
            faces0=_tubeFaces(sections,startCap=startCap,endCap=endCap,optimize=optimize))
        _removeDuplicates(points0,faces0);

function sectionZ(section,z) = [for(xy=section) [xy[0],xy[1],z]];

function shiftSection(section,delta) = [for(p=section) [for(i=[0:len(delta)-1]) (p[i]==undef?0:p[i])+delta[i]]];

module tubeMesh(sections,startCap=true,endCap=true,optimize=true) {
    pAndF = pointsAndFaces(sections,startCap=startCap,endCap=endCap,optimize=optimize);
    polyhedron(points=pAndF[0],faces=pAndF[1]);
}

// increase number of points from len(section) to n
function _interpolateSection(section,n) =
        let(m=len(section))
        n == m ? section :
        n < m ? undef :
            [for(i=[0:m-1])
                let(cur=floor(i*n/m),
                    k=floor((i+1)*n/m)-cur,
                    i2=(i+1)%m)
                    for(j=[0:k-1])
                        let(t=j/k)
                            section[i]*(1-t)+section[i2]*t];

function arcPoints(r=10,d=undef,start=0,end=180,z=undef) =
            let(r=d==undef?r:d/2,
                n=getPointsAround(abs(end-start)))
                    r*[for(i=[0:n])
                        let(angle=start+i*(end-start)/n) [cos(angle),sin(angle)]];

function ngonPoints(n=4,r=10,d=undef,rotate=0,z=undef) =
            let(r=d==undef?r:d/2)
            z==undef ?
            r*[for(i=[0:n-1]) let(angle=i*360/n+rotate) [cos(angle),sin(angle)]] :
            [for(i=[0:n-1]) let(angle=i*360/n+rotate) [r*cos(angle),r*sin(angle),z]];

function starPoints(n=10,r1=5,r2=10,rotate=0,z=undef) =
          z==undef ?
            [for(i=[0:2*n-1]) let(angle=i*180/n+rotate) (i%2?r1:r2) * [cos(angle),sin(angle)]] :
            [for(i=[0:2*n-1]) let(angle=i*180/n+rotate, r=i%2?r1:r2) [r*cos(angle),r*sin(angle),z]];

function roundedSquarePoints(size=[10,10],radius=2,z=undef) =
    let(n=$fn?$fn:32,
        x=len(size)>=2 ? size[0] : size,
        y=len(size)>=2 ? size[1] : size,
        centers=[[x-radius,y-radius],[radius,y-radius],[radius,radius],[x-radius,radius]],
        section=[for(i=[0:n-1])
            let(center=centers[floor(i*4/n)],
                angle=360*i/n)
            center+radius*[cos(angle),sin(angle)]])
        z==undef ? section : sectionZ(section,z);

function getPointsAround(radius, angle=360) =
    max(3, $fn ? ceil($fn*angle/360) :
        max(floor(0.5+angle/$fa), floor(0.5+2*radius*PI*angle/360/$fs)));

// warning: no guarantee of perfect convexity
module mySphere(r=10,d=undef) {
    GA = 2.39996322972865332 * 180 / PI;
    radius = d==undef ? r : d/2;
    pointsAround = getPointsAround(radius);
    numSlices0 = (pointsAround + pointsAround % 2)/2;
    numSlices = numSlices0 + (numSlices0%2);
    sections = radius*[for(i=[0:numSlices])
                    i == 0 ? [[0,0,-1]] :
                    i == numSlices ? [[0,0,1]] :
                    let(
                        lat = (i-numSlices/2)/(numSlices/2)*90,
                        z1 = sin(lat),
                        r1 = cos(lat),
                        count = max(3,floor(0.5 + pointsAround * abs(r1))))
                        ngonPoints(count,r=r1,z=z1)];
    data = pointsAndFaces(sections,optimize=false);
    polyhedron(points=data[0], faces=data[1]);
}

module morphExtrude(section1,section2,height=undef,twist=0,numSlices=10,curve="t",curveParams=[[]],startCap=true,endCap=true,optimize=false) {

    fc = compileFunction(curve);
    n = max(len(section1),len(section2));

    section1interp = _interpolateSection(section1,n);
    section2interp = _interpolateSection(section2,n);
    sections = height == undef ?
                      [for(i=[0:numSlices])
                        let(t=i/numSlices)
                        (1-t)*section1interp+t*section2interp] :
                      [for(i=[0:numSlices])
                        let(t=i/numSlices,
                            t1=eval(fc,concat([["t",t]],curveParams)),
                            theta = t*twist,
                            section=(1-t1)*section1interp+t1*section2interp)
                        [for(p=section) [p[0]*cos(theta)-p[1]*sin(theta),p[0]*sin(theta)+p[1]*cos(theta),height*t]]];

    tubeMesh(sections,startCap=startCap,endCap=endCap,optimize=false);
}

module cone(r=10,d=undef,height=10) {
    radius = d==undef ? r : d/2;
    pointsAround =
        $fn ? $fn :
        max(3, floor(0.5+360/$fa), floor(0.5+2*radius*PI/$fs));
    morphExtrude(ngonPoints(n=pointsAround,r=radius), [[0,0]], height=height,optimize=false);
}

module prism(base=[[0,0,0],[1,0,0],[0,1,0]], vertical=[0,0,1]) {
    morphExtrude(base,[for(v=base) v+vertical],numSlices=1);
}


//END: use <tubemesh.scad>;



module dummy() {}

nudge = 0.01;

slice0 = [ [ -w/2,-h/2 ],[ w/2,-h/2], [w/2,h/2], [-w/2,h/2]];
slice1 = [ [ -w/2+taper,-h/2+taper],[ w/2-taper,-h/2+taper], [w/2-taper,h/2-taper], [-w/2+taper,h/2-taper]];

$fn = 32;
difference() {
    morphExtrude(slice0,slice1,height=thickness,curve=taperFormula,numSlices=40);
    translate([0,0,-nudge])
    for (s=[-1,1]) {
        translate([0,s*screwSpacing/2,0]) {
        cylinder(d=screwDiameter,h=thickness+2*nudge);
        translate([0,0,thickness-screwHeadDepth]) cylinder(d=screwHeadDiameter,h=screwHeadDepth+nudge*2);
        }
    }
}
